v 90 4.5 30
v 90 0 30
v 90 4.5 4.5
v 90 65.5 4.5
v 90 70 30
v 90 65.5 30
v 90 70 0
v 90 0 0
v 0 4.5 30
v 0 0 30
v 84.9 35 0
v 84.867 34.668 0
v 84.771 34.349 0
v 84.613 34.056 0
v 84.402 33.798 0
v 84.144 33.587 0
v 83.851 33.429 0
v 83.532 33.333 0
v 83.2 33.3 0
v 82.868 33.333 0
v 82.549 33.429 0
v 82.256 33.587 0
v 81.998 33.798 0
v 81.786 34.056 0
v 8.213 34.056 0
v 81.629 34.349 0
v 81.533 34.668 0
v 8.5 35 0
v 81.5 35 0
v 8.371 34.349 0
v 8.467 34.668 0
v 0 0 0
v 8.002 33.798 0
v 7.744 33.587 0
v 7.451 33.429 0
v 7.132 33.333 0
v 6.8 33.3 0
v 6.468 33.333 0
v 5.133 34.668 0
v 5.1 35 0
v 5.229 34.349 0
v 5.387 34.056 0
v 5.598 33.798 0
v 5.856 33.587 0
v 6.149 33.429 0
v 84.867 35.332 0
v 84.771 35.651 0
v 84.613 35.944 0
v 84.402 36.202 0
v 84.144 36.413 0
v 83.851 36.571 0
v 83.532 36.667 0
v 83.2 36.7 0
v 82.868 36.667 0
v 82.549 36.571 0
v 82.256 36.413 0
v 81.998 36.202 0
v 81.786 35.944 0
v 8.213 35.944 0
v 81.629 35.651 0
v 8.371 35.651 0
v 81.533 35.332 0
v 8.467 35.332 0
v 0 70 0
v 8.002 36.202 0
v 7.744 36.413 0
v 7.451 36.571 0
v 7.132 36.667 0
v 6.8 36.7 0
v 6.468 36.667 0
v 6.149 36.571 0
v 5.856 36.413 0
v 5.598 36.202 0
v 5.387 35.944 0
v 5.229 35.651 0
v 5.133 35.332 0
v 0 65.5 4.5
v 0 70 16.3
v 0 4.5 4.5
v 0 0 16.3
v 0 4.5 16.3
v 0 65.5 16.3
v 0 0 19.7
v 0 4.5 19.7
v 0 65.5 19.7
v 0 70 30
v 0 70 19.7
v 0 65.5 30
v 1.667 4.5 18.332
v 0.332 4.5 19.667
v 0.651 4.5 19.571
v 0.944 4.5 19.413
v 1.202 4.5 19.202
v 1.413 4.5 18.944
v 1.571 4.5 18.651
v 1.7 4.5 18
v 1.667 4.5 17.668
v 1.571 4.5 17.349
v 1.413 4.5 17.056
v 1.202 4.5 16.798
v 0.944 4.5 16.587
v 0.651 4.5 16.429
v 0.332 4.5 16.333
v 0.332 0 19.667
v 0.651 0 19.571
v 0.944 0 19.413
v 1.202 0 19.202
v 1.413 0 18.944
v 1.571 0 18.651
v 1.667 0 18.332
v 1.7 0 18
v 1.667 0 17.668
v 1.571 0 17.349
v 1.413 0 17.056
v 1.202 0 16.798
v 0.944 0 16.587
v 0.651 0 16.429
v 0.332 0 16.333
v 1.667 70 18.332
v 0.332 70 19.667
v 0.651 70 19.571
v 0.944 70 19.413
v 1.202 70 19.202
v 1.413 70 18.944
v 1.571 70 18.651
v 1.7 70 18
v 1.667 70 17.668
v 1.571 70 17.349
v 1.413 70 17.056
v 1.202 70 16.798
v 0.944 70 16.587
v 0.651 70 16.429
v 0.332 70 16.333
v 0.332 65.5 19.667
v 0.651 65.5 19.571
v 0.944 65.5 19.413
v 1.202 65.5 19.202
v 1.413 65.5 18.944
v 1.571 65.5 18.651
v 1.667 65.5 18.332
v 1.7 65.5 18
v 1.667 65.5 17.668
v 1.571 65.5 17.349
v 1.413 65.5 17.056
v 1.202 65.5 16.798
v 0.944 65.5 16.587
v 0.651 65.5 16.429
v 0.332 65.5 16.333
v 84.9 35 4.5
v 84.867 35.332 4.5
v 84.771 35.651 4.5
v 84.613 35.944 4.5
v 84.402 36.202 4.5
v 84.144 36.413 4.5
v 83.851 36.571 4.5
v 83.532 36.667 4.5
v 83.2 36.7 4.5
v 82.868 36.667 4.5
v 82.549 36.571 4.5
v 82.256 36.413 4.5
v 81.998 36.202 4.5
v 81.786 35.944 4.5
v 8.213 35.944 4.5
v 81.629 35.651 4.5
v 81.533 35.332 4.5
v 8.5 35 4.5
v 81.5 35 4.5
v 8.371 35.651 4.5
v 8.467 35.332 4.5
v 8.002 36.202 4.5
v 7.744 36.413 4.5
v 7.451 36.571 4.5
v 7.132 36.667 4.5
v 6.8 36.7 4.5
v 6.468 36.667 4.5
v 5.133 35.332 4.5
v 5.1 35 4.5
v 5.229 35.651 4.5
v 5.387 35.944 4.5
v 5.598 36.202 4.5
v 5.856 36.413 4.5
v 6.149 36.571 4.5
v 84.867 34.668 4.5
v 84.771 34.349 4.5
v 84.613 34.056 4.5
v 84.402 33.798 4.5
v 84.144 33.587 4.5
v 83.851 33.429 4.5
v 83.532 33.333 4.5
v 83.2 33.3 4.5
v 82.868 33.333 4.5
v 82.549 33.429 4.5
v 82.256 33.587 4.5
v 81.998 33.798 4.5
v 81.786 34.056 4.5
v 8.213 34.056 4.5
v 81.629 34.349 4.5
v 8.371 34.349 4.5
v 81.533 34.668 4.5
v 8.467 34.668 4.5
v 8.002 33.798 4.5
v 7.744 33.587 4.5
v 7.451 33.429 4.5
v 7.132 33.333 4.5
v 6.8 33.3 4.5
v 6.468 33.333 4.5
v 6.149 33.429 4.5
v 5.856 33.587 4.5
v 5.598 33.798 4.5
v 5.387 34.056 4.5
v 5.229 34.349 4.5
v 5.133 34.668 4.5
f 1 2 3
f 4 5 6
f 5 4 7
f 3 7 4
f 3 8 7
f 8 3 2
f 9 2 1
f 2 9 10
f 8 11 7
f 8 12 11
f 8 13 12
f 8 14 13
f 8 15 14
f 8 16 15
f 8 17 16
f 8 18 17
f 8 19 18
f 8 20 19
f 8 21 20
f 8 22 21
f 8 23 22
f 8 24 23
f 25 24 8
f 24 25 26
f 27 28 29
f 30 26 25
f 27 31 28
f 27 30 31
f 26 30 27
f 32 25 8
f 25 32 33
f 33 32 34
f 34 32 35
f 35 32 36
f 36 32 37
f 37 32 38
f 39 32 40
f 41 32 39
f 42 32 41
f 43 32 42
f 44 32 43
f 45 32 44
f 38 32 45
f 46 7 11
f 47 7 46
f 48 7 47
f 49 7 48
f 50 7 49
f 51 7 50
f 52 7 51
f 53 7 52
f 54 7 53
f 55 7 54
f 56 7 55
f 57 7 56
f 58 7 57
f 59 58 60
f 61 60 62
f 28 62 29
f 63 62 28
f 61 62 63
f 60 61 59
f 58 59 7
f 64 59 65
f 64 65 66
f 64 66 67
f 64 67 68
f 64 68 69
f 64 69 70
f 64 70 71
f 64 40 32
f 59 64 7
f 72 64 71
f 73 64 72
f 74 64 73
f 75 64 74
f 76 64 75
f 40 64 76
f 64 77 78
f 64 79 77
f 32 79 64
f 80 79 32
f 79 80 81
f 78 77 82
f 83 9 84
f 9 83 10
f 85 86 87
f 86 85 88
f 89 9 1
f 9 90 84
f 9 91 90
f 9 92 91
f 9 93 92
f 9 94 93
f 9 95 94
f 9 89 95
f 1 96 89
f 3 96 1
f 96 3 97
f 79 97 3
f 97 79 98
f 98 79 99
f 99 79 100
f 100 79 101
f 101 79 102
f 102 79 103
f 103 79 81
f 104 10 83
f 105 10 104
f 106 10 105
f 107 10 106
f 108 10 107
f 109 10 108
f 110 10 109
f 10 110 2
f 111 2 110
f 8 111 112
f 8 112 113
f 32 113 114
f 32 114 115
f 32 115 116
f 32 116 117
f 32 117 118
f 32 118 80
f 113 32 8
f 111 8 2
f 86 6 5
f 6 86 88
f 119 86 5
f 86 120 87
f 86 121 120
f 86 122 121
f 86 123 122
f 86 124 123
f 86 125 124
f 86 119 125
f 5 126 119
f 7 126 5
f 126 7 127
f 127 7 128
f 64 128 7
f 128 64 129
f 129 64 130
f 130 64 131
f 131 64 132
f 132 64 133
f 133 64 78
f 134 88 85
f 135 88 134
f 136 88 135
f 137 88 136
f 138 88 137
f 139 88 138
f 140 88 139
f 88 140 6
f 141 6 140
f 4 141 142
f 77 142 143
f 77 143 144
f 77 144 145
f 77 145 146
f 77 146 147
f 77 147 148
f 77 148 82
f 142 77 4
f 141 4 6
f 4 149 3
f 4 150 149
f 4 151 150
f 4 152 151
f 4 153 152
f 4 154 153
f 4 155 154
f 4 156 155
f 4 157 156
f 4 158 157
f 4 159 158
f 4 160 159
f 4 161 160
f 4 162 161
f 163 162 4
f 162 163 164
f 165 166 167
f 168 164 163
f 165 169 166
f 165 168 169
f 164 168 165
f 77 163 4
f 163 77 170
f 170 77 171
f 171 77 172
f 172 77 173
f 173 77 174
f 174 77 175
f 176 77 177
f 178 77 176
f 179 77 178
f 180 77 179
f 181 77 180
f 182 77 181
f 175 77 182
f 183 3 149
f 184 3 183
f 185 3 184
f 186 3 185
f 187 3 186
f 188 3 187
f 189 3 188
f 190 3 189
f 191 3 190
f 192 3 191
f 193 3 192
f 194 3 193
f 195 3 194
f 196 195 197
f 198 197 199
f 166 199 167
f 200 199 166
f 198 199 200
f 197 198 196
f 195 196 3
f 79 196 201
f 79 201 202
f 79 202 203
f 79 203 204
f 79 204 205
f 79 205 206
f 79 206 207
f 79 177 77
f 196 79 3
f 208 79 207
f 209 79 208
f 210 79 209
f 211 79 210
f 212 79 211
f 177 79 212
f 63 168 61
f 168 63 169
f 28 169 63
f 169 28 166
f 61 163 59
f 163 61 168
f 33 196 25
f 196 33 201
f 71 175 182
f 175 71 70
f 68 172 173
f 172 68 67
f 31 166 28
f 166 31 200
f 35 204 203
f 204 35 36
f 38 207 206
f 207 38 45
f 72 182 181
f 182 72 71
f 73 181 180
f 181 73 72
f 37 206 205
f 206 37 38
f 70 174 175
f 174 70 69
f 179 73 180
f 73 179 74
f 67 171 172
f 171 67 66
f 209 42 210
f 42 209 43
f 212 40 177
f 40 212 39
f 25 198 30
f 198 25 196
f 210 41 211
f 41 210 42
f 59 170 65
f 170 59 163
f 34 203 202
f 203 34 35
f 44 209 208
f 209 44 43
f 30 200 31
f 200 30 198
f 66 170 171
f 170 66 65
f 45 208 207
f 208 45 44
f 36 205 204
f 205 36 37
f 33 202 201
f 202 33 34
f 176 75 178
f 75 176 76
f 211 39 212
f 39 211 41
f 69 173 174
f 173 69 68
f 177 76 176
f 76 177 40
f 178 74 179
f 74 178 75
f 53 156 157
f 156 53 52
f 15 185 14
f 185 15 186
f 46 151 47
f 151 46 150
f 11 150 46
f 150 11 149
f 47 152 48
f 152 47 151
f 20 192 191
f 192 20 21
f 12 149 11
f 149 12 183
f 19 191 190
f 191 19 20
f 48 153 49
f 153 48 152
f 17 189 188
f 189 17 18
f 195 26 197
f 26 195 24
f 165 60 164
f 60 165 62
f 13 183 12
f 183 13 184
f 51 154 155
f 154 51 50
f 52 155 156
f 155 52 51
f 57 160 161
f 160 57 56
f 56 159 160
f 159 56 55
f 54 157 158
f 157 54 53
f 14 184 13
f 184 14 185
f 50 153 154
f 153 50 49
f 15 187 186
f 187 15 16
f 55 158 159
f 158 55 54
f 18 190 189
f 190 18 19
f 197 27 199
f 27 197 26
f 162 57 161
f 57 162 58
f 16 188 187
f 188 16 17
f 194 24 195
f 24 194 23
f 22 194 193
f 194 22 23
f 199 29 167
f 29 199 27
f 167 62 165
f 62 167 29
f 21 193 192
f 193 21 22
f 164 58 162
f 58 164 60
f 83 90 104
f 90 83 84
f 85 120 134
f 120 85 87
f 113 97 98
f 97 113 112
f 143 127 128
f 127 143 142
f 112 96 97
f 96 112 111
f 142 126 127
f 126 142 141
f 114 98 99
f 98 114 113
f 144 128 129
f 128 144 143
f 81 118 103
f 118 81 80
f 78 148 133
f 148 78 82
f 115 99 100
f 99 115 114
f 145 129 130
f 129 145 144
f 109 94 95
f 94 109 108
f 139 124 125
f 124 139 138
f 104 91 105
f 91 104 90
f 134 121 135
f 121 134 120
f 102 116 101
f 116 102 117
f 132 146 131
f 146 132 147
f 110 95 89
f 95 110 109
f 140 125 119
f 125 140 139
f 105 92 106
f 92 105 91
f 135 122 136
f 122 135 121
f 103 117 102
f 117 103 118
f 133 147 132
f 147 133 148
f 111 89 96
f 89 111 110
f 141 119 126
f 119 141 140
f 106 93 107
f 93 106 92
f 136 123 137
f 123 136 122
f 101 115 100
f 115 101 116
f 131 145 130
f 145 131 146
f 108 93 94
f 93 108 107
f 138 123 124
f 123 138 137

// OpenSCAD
$fn = 32;

// ----------------------------------------------------------------------
// U-bracket: 90 x 70 x 30 mm
// ----------------------------------------------------------------------

// --- parameters (mm) ---
rail_len = 90;            // outer length, X
jaw_w = 70;               // outer width, Y
jaw_h = 30;               // upright height, Z
web_t = 4.5;              // wall thickness
hole_d = 3.4;             // clearance for M3

module hole_z(px, py) {
  translate([px, py, -2.5]) cylinder(h = web_t + 5, d = hole_d);
}
module hole_y_pz(pz) {
  /* through both uprights along Y */
  translate([0, -2.5, pz]) rotate([-90, 0, 0]) cylinder(h = jaw_w + 5, d = hole_d);
}

module base() {
  cube([rail_len, jaw_w, web_t]);
}

module uprights() {
  cube([rail_len, web_t, jaw_h]);
  translate([0, jaw_w - web_t, 0]) cube([rail_len, web_t, jaw_h]);
}

difference() {
  union() {
    base();
    uprights();
  }
  hole_z(6.8, 35);
  hole_z(83.2, 35);
  hole_y_pz(18);
}
